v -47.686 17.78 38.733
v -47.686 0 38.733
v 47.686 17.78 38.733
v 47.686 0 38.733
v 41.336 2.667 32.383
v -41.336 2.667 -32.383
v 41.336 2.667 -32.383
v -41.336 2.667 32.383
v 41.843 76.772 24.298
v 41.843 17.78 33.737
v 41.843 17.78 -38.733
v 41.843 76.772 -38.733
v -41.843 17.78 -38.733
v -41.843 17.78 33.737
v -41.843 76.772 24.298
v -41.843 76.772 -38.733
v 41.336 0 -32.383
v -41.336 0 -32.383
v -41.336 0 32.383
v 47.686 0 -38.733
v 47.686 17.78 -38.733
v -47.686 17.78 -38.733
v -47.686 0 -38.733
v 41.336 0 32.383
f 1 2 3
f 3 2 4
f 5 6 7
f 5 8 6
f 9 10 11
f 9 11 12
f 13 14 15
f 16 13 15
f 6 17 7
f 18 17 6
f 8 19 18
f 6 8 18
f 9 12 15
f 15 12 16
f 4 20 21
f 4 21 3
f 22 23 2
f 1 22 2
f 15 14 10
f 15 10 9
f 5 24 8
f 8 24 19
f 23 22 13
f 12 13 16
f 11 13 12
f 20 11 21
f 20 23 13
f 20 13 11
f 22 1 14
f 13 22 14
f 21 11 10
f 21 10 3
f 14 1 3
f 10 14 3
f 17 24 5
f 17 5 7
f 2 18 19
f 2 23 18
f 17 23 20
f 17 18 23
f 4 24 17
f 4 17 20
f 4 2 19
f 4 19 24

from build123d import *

# Parameters (mm, degrees)
F0_W         = 95.3711643815
F0_H         = 77.4655118585
F1_DEPTH     = 10.16
F2_T         = -6.35
F3_DEPTH     = 5.588
F4_DEPTH     = 3.8735
F5_DEPTH     = 0.5715
F6_DEPTH     = 7.62
F7_W         = 83.6853682995
F7_H         = 57.4865713716
F7_H_2       = 9.9894702435
F8_DEPTH     = 58.9915
F9_DEPTH     = 5.715
F10_T4_DEPTH = 413.7319634586


# Not quite as in the source:
# - a fillet or chamfer that OpenCascade refuses, or shapes differently, is made with other operations: its cross-section is extruded or revolved along the edge and cut away or added


with BuildPart() as f1:
    # F0 (on Front) → F1 (new body)
    with BuildSketch(Plane.XZ):
        Rectangle(F0_W, F0_H)
    extrude(amount=-F1_DEPTH)

    # F2
    f2_openings = [f1.faces().sort_by_distance(p)[0] for p in [
        (0, 0, 0),
    ]]
    offset(amount=F2_T, openings=f2_openings)

    # F3 (add): a face of the model
    f3_faces = [f1.faces().sort_by_distance(p)[0] for p in [
        (0, 3.81, 0),
    ]]
    extrude(f3_faces, amount=F3_DEPTH)

    # F4 (cut): a face of the model
    f4_faces = [f1.faces().sort_by_distance(p)[0] for p in [
        (0, -1.778, 0),
    ]]
    extrude(f4_faces, amount=-F4_DEPTH, mode=Mode.SUBTRACT)

    # F5 (cut): a face of the model
    f5_faces = [f1.faces().sort_by_distance(p)[0] for p in [
        (0, 2.0955, 0),
    ]]
    extrude(f5_faces, amount=-F5_DEPTH, mode=Mode.SUBTRACT)

    # F6 (add): a face of the model
    f6_faces = [f1.faces().sort_by_distance(p)[0] for p in [
        (0, 10.16, 0),
    ]]
    extrude(f6_faces, amount=F6_DEPTH)

    # F7 (on face) → F8 (join)
    with BuildSketch(Plane(origin=(0, 17.78, 0), x_dir=(-1, 0, 0), z_dir=(0, 1, 0))):
        Rectangle(F7_W, F7_H)
        with Locations((0, -33.7380208075)):
            Rectangle(F7_W, F7_H_2)
    extrude(amount=F8_DEPTH)

    # F9 (add): a face of the model
    f9_faces = [f1.faces().sort_by_distance(p)[0] for p in [
        (0, 47.27575, 28.7432856858),
    ]]
    extrude(f9_faces, amount=F9_DEPTH)

    # F10: chamfer of 63.5 x 10.16 on 1 edges, made by hand


with BuildPart() as f10_tool2:
    # F10_s3 → F10_t4 (new body)
    with BuildSketch(Plane.YZ.offset(-206.8659817293)):
        Polygon((13.2715, 34.4582856858), (76.7715, 24.2982856858), (76.7715, 34.4582856858), align=None)
    extrude(amount=F10_T4_DEPTH)

    split(bisect_by=Plane.XZ.offset(-17.78), keep=Keep.BOTTOM)


with BuildPart() as f1_1:
    add(f1.part)

    # F10_t1: cut F10_tool2
    add(f10_tool2.part, mode=Mode.SUBTRACT)


solid = f1_1.part
